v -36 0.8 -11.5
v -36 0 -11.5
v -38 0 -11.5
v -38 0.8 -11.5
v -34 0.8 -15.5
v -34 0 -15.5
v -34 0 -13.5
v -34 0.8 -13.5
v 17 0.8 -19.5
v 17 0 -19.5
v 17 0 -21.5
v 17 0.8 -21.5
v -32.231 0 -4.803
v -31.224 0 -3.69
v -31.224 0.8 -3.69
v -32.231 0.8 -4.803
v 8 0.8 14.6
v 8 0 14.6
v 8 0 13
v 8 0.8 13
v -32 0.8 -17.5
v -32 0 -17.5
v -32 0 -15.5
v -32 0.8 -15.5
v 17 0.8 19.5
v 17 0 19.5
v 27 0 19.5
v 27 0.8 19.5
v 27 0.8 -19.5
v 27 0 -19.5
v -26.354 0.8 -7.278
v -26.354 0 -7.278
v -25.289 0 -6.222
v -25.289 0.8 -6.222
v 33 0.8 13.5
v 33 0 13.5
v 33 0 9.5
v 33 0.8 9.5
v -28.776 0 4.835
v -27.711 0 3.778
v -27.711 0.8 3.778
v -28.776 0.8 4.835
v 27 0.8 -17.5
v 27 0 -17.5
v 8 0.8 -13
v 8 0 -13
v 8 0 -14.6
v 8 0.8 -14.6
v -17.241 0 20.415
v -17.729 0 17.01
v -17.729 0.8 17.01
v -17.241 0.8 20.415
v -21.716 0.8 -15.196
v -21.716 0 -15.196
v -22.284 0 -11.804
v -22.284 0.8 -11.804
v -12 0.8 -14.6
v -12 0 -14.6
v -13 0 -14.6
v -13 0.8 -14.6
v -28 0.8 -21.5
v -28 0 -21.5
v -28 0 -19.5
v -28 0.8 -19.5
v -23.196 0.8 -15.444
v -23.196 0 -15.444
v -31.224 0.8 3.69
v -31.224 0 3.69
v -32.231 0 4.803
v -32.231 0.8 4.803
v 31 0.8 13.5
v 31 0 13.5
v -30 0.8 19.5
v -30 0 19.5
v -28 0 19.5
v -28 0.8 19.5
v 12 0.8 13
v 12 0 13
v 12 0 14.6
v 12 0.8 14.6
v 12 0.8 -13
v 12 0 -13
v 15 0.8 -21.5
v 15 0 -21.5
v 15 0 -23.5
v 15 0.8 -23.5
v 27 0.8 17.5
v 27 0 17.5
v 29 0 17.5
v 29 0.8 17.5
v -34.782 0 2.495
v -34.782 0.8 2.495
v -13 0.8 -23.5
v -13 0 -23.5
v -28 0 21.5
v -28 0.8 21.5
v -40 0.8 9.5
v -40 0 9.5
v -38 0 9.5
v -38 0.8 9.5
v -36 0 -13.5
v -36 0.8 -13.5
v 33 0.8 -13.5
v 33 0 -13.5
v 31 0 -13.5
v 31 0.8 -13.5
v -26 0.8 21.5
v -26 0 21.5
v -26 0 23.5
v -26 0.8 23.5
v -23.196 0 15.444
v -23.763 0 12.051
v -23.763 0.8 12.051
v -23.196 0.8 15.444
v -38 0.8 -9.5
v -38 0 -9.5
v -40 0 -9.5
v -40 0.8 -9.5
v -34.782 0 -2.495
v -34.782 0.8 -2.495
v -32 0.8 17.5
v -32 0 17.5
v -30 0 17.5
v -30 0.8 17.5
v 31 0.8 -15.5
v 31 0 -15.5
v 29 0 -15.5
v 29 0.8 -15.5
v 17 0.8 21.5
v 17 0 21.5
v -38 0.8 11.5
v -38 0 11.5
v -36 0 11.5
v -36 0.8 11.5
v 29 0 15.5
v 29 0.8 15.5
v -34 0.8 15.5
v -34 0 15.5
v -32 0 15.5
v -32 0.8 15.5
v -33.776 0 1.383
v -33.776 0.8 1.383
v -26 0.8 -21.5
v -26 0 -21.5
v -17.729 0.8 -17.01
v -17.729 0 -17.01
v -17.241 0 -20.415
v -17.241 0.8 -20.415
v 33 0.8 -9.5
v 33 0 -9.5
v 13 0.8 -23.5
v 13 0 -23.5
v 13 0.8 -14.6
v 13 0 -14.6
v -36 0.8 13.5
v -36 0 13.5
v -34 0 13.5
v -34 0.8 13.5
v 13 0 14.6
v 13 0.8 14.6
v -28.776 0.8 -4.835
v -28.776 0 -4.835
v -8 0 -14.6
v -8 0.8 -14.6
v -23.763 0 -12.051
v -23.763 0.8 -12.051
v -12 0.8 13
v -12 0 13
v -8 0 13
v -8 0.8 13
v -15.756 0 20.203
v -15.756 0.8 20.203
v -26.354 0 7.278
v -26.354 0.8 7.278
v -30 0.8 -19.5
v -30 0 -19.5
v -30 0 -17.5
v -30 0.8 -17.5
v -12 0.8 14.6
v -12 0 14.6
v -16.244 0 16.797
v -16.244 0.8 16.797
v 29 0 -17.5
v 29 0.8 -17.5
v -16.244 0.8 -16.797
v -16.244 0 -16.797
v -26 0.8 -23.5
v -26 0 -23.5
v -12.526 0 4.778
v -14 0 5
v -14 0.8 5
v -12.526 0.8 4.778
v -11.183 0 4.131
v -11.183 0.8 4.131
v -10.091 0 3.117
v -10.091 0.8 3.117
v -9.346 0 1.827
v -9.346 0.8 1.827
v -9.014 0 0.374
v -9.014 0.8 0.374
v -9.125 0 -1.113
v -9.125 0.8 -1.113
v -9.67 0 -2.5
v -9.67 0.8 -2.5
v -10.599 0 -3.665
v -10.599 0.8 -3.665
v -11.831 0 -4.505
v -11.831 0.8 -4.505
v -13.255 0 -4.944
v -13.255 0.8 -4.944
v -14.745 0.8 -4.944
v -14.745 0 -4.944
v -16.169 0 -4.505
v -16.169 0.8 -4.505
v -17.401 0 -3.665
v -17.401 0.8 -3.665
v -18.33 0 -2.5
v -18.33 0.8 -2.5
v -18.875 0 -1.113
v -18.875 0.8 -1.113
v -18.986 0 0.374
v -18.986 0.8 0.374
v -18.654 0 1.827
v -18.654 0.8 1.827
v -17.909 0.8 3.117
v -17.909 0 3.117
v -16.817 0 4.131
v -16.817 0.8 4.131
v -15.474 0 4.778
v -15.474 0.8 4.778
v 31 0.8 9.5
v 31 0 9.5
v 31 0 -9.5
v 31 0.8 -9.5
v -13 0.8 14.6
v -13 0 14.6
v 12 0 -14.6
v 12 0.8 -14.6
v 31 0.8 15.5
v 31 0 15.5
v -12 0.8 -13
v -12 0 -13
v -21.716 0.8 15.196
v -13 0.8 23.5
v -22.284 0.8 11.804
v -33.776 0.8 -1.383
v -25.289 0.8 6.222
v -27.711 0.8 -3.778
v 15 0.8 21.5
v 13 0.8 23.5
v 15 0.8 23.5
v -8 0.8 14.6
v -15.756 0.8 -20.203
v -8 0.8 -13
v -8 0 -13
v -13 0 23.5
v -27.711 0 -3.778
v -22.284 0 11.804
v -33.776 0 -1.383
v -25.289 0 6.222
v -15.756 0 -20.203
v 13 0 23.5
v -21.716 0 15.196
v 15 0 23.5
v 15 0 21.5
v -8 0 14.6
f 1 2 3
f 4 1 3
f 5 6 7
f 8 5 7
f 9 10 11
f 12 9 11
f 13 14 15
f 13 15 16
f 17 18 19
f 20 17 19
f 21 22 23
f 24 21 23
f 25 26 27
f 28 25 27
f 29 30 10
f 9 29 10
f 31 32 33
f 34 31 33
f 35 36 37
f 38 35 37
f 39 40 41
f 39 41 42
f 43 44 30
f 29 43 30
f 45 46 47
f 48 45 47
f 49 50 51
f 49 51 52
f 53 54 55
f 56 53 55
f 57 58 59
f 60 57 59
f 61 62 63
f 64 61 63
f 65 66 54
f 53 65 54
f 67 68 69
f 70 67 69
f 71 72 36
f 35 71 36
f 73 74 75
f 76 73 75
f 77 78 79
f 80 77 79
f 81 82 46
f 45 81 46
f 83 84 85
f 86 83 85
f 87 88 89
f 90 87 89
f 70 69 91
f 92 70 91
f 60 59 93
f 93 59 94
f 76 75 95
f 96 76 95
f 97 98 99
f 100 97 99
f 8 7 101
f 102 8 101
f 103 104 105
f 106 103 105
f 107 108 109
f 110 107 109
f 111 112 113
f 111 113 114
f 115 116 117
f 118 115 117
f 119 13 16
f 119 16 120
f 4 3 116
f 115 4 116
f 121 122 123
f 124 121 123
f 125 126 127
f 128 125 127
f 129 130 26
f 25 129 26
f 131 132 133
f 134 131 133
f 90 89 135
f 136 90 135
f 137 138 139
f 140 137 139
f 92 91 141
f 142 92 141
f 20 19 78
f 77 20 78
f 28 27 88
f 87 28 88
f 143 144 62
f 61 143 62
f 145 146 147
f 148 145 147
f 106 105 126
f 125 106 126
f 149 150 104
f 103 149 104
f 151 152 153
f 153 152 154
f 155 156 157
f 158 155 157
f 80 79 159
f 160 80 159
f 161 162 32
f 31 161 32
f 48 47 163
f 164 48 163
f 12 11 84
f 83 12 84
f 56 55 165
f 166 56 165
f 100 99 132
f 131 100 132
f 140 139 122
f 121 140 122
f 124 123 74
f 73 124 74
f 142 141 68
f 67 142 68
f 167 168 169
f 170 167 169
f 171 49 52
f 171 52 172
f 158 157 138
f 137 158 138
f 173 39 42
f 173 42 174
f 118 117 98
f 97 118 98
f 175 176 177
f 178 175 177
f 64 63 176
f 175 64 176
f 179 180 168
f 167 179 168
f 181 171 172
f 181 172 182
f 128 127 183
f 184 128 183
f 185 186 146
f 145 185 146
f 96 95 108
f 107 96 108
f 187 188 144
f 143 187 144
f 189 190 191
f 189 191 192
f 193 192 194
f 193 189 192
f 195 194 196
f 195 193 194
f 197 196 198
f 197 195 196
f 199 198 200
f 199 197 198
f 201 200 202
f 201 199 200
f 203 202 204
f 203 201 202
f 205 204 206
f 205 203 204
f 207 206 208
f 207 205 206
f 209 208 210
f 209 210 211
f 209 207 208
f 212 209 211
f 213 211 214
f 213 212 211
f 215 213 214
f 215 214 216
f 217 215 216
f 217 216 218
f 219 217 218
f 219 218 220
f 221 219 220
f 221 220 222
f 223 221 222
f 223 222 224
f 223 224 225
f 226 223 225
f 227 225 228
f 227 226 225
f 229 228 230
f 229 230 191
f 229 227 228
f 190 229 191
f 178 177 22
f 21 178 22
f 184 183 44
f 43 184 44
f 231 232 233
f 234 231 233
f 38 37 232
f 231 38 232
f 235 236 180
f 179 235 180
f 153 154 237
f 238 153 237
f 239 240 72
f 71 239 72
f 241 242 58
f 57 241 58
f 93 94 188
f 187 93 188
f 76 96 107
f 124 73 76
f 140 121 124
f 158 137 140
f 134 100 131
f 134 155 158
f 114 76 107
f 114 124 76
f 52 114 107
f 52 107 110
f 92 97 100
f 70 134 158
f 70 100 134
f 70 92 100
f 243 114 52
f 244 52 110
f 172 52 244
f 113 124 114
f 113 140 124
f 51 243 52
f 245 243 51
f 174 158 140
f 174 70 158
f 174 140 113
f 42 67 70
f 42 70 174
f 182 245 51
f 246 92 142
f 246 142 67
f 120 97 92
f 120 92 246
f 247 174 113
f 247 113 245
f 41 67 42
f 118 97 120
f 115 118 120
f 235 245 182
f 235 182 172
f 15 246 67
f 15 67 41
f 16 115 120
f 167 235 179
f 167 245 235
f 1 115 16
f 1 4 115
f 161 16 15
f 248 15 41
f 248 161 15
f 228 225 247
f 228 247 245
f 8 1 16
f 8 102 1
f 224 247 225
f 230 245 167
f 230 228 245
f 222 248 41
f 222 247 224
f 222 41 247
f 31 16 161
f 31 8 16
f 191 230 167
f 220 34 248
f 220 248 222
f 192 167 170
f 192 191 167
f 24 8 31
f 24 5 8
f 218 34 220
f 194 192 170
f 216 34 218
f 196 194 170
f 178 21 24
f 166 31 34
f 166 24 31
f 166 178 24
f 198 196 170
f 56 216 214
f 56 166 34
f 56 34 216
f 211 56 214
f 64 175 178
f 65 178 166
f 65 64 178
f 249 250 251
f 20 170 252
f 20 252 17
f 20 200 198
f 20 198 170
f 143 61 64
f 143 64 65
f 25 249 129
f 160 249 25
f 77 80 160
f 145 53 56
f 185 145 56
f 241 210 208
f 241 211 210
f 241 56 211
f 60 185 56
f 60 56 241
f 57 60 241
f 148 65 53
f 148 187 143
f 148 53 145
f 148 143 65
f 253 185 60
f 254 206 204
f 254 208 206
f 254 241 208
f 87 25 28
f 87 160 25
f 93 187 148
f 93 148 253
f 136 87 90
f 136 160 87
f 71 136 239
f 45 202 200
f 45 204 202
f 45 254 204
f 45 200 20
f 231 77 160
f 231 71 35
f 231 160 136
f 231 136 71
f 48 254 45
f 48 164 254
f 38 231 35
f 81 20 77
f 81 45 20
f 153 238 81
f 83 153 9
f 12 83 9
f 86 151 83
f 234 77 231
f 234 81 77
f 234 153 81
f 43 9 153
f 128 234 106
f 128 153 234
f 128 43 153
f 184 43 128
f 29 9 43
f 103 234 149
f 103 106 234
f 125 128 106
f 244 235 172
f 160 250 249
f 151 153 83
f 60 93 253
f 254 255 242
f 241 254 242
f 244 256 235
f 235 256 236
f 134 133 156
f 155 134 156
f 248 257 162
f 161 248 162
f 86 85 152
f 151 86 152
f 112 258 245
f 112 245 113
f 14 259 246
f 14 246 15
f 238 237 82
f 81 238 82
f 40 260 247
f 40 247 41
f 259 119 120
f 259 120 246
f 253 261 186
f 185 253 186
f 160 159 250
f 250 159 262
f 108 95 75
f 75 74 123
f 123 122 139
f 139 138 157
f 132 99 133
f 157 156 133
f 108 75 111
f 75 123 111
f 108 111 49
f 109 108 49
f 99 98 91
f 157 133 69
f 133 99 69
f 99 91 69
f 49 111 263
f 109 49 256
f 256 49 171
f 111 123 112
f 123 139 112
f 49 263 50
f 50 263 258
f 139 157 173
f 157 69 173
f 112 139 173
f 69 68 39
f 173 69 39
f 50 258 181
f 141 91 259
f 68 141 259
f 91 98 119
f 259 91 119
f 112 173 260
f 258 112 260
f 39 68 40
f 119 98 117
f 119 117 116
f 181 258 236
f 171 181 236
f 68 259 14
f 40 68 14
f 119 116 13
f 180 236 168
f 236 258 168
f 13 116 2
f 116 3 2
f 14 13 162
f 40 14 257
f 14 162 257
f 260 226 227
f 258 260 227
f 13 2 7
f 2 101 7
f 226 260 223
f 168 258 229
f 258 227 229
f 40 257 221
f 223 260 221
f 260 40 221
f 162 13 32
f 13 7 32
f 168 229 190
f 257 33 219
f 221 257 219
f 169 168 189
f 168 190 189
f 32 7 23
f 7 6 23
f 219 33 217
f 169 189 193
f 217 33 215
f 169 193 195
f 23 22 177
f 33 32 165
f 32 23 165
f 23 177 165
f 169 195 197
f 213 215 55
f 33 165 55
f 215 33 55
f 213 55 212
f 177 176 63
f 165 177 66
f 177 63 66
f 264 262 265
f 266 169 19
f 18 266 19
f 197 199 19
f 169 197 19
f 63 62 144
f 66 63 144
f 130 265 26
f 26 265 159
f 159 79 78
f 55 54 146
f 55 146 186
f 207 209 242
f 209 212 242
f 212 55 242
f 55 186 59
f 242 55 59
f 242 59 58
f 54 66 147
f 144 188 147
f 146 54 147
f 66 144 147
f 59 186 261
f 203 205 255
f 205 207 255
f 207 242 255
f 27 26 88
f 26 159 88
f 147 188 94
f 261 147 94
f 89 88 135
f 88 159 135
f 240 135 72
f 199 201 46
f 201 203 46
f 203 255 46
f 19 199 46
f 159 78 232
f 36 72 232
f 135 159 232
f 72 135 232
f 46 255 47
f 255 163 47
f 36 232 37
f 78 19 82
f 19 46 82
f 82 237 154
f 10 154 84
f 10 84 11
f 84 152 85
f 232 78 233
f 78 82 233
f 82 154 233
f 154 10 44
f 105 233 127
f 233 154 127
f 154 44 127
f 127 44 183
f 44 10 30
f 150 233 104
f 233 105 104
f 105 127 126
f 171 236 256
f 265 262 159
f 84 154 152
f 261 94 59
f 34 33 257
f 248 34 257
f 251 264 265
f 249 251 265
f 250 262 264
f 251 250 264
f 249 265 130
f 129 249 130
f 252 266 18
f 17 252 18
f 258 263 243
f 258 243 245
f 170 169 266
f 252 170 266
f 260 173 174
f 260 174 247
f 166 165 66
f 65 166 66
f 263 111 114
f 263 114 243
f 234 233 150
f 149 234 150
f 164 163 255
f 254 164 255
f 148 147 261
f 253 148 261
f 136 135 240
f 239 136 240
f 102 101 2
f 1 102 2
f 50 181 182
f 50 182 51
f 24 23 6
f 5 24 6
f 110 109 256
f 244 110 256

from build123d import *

# Parameters (mm, degrees)
SKETCH_5_R      = 5
EXTRUDE_1_DEPTH = 0.8


with BuildPart() as part:
    # 스케치5 → 보스-돌출1 (new body)
    with BuildSketch(Plane(origin=(0, 0, 0), x_dir=(1, 0, 0), z_dir=(0, 1, 0))):
        Polygon((-13, -23.5), (-13, -14.6), (-12, -14.6), (-12, -13), (-8, -13), (-8, -14.6), (8, -14.6), (8, -13), (12, -13), (12, -14.6), (13, -14.6), (13, -23.5), (15, -23.5), (15, -21.5), (17, -21.5), (17, -19.5), (27, -19.5), (27, -17.5), (29, -17.5), (29, -15.5), (31, -15.5), (31, -13.5), (33, -13.5), (33, -9.5), (31, -9.5), (31, 9.5), (33, 9.5), (33, 13.5), (31, 13.5), (31, 15.5), (29, 15.5), (29, 17.5), (27, 17.5), (27, 19.5), (17, 19.5), (17, 21.5), (15, 21.5), (15, 23.5), (13, 23.5), (13, 14.6), (12, 14.6), (12, 13), (8, 13), (8, 14.6), (-8, 14.6), (-8, 13), (-12, 13), (-12, 14.6), (-13, 14.6), (-13, 23.5), (-26, 23.5), (-26, 21.5), (-28, 21.5), (-28, 19.5), (-30, 19.5), (-30, 17.5), (-32, 17.5), (-32, 15.5), (-34, 15.5), (-34, 13.5), (-36, 13.5), (-36, 11.5), (-38, 11.5), (-38, 9.5), (-40, 9.5), (-40, -9.5), (-38, -9.5), (-38, -11.5), (-36, -11.5), (-36, -13.5), (-34, -13.5), (-34, -15.5), (-32, -15.5), (-32, -17.5), (-30, -17.5), (-30, -19.5), (-28, -19.5), (-28, -21.5), (-26, -21.5), (-26, -23.5), align=None)
        with Locations((-14, 0)):
            Circle(SKETCH_5_R, mode=Mode.SUBTRACT)
        Polygon((-17.728524487, -17.009831185), (-17.241222705, -20.415141299), (-15.756349109, -20.202655057), (-16.243650891, -16.797344943), align=None, mode=Mode.SUBTRACT)
        Polygon((-23.763263852, -12.051103665), (-23.19560882, -15.443944328), (-21.716172484, -15.196420332), (-22.283827516, -11.803579668), align=None, mode=Mode.SUBTRACT)
        Polygon((-28.776184385, -4.834516937), (-26.354359033, -7.277540056), (-25.289087324, -6.22151156), (-27.710912676, -3.77848844), align=None, mode=Mode.SUBTRACT)
        Polygon((-32.230719309, -4.802671603), (-34.781815362, -2.494965181), (-33.775548026, -1.382568646), (-31.224451974, -3.690275068), align=None, mode=Mode.SUBTRACT)
        Polygon((-17.241222705, 20.415141299), (-15.756349109, 20.202655057), (-16.243650891, 16.797344943), (-17.728524487, 17.009831185), align=None, mode=Mode.SUBTRACT)
        Polygon((-23.19560882, 15.443944328), (-21.716172484, 15.196420332), (-22.283827516, 11.803579668), (-23.763263852, 12.051103665), align=None, mode=Mode.SUBTRACT)
        Polygon((-26.354359033, 7.277540056), (-25.289087324, 6.22151156), (-27.710912676, 3.77848844), (-28.776184385, 4.834516937), align=None, mode=Mode.SUBTRACT)
        Polygon((-34.781815362, 2.494965181), (-33.775548026, 1.382568646), (-31.224451974, 3.690275068), (-32.230719309, 4.802671603), align=None, mode=Mode.SUBTRACT)
    extrude(amount=EXTRUDE_1_DEPTH)


solid = part.part
